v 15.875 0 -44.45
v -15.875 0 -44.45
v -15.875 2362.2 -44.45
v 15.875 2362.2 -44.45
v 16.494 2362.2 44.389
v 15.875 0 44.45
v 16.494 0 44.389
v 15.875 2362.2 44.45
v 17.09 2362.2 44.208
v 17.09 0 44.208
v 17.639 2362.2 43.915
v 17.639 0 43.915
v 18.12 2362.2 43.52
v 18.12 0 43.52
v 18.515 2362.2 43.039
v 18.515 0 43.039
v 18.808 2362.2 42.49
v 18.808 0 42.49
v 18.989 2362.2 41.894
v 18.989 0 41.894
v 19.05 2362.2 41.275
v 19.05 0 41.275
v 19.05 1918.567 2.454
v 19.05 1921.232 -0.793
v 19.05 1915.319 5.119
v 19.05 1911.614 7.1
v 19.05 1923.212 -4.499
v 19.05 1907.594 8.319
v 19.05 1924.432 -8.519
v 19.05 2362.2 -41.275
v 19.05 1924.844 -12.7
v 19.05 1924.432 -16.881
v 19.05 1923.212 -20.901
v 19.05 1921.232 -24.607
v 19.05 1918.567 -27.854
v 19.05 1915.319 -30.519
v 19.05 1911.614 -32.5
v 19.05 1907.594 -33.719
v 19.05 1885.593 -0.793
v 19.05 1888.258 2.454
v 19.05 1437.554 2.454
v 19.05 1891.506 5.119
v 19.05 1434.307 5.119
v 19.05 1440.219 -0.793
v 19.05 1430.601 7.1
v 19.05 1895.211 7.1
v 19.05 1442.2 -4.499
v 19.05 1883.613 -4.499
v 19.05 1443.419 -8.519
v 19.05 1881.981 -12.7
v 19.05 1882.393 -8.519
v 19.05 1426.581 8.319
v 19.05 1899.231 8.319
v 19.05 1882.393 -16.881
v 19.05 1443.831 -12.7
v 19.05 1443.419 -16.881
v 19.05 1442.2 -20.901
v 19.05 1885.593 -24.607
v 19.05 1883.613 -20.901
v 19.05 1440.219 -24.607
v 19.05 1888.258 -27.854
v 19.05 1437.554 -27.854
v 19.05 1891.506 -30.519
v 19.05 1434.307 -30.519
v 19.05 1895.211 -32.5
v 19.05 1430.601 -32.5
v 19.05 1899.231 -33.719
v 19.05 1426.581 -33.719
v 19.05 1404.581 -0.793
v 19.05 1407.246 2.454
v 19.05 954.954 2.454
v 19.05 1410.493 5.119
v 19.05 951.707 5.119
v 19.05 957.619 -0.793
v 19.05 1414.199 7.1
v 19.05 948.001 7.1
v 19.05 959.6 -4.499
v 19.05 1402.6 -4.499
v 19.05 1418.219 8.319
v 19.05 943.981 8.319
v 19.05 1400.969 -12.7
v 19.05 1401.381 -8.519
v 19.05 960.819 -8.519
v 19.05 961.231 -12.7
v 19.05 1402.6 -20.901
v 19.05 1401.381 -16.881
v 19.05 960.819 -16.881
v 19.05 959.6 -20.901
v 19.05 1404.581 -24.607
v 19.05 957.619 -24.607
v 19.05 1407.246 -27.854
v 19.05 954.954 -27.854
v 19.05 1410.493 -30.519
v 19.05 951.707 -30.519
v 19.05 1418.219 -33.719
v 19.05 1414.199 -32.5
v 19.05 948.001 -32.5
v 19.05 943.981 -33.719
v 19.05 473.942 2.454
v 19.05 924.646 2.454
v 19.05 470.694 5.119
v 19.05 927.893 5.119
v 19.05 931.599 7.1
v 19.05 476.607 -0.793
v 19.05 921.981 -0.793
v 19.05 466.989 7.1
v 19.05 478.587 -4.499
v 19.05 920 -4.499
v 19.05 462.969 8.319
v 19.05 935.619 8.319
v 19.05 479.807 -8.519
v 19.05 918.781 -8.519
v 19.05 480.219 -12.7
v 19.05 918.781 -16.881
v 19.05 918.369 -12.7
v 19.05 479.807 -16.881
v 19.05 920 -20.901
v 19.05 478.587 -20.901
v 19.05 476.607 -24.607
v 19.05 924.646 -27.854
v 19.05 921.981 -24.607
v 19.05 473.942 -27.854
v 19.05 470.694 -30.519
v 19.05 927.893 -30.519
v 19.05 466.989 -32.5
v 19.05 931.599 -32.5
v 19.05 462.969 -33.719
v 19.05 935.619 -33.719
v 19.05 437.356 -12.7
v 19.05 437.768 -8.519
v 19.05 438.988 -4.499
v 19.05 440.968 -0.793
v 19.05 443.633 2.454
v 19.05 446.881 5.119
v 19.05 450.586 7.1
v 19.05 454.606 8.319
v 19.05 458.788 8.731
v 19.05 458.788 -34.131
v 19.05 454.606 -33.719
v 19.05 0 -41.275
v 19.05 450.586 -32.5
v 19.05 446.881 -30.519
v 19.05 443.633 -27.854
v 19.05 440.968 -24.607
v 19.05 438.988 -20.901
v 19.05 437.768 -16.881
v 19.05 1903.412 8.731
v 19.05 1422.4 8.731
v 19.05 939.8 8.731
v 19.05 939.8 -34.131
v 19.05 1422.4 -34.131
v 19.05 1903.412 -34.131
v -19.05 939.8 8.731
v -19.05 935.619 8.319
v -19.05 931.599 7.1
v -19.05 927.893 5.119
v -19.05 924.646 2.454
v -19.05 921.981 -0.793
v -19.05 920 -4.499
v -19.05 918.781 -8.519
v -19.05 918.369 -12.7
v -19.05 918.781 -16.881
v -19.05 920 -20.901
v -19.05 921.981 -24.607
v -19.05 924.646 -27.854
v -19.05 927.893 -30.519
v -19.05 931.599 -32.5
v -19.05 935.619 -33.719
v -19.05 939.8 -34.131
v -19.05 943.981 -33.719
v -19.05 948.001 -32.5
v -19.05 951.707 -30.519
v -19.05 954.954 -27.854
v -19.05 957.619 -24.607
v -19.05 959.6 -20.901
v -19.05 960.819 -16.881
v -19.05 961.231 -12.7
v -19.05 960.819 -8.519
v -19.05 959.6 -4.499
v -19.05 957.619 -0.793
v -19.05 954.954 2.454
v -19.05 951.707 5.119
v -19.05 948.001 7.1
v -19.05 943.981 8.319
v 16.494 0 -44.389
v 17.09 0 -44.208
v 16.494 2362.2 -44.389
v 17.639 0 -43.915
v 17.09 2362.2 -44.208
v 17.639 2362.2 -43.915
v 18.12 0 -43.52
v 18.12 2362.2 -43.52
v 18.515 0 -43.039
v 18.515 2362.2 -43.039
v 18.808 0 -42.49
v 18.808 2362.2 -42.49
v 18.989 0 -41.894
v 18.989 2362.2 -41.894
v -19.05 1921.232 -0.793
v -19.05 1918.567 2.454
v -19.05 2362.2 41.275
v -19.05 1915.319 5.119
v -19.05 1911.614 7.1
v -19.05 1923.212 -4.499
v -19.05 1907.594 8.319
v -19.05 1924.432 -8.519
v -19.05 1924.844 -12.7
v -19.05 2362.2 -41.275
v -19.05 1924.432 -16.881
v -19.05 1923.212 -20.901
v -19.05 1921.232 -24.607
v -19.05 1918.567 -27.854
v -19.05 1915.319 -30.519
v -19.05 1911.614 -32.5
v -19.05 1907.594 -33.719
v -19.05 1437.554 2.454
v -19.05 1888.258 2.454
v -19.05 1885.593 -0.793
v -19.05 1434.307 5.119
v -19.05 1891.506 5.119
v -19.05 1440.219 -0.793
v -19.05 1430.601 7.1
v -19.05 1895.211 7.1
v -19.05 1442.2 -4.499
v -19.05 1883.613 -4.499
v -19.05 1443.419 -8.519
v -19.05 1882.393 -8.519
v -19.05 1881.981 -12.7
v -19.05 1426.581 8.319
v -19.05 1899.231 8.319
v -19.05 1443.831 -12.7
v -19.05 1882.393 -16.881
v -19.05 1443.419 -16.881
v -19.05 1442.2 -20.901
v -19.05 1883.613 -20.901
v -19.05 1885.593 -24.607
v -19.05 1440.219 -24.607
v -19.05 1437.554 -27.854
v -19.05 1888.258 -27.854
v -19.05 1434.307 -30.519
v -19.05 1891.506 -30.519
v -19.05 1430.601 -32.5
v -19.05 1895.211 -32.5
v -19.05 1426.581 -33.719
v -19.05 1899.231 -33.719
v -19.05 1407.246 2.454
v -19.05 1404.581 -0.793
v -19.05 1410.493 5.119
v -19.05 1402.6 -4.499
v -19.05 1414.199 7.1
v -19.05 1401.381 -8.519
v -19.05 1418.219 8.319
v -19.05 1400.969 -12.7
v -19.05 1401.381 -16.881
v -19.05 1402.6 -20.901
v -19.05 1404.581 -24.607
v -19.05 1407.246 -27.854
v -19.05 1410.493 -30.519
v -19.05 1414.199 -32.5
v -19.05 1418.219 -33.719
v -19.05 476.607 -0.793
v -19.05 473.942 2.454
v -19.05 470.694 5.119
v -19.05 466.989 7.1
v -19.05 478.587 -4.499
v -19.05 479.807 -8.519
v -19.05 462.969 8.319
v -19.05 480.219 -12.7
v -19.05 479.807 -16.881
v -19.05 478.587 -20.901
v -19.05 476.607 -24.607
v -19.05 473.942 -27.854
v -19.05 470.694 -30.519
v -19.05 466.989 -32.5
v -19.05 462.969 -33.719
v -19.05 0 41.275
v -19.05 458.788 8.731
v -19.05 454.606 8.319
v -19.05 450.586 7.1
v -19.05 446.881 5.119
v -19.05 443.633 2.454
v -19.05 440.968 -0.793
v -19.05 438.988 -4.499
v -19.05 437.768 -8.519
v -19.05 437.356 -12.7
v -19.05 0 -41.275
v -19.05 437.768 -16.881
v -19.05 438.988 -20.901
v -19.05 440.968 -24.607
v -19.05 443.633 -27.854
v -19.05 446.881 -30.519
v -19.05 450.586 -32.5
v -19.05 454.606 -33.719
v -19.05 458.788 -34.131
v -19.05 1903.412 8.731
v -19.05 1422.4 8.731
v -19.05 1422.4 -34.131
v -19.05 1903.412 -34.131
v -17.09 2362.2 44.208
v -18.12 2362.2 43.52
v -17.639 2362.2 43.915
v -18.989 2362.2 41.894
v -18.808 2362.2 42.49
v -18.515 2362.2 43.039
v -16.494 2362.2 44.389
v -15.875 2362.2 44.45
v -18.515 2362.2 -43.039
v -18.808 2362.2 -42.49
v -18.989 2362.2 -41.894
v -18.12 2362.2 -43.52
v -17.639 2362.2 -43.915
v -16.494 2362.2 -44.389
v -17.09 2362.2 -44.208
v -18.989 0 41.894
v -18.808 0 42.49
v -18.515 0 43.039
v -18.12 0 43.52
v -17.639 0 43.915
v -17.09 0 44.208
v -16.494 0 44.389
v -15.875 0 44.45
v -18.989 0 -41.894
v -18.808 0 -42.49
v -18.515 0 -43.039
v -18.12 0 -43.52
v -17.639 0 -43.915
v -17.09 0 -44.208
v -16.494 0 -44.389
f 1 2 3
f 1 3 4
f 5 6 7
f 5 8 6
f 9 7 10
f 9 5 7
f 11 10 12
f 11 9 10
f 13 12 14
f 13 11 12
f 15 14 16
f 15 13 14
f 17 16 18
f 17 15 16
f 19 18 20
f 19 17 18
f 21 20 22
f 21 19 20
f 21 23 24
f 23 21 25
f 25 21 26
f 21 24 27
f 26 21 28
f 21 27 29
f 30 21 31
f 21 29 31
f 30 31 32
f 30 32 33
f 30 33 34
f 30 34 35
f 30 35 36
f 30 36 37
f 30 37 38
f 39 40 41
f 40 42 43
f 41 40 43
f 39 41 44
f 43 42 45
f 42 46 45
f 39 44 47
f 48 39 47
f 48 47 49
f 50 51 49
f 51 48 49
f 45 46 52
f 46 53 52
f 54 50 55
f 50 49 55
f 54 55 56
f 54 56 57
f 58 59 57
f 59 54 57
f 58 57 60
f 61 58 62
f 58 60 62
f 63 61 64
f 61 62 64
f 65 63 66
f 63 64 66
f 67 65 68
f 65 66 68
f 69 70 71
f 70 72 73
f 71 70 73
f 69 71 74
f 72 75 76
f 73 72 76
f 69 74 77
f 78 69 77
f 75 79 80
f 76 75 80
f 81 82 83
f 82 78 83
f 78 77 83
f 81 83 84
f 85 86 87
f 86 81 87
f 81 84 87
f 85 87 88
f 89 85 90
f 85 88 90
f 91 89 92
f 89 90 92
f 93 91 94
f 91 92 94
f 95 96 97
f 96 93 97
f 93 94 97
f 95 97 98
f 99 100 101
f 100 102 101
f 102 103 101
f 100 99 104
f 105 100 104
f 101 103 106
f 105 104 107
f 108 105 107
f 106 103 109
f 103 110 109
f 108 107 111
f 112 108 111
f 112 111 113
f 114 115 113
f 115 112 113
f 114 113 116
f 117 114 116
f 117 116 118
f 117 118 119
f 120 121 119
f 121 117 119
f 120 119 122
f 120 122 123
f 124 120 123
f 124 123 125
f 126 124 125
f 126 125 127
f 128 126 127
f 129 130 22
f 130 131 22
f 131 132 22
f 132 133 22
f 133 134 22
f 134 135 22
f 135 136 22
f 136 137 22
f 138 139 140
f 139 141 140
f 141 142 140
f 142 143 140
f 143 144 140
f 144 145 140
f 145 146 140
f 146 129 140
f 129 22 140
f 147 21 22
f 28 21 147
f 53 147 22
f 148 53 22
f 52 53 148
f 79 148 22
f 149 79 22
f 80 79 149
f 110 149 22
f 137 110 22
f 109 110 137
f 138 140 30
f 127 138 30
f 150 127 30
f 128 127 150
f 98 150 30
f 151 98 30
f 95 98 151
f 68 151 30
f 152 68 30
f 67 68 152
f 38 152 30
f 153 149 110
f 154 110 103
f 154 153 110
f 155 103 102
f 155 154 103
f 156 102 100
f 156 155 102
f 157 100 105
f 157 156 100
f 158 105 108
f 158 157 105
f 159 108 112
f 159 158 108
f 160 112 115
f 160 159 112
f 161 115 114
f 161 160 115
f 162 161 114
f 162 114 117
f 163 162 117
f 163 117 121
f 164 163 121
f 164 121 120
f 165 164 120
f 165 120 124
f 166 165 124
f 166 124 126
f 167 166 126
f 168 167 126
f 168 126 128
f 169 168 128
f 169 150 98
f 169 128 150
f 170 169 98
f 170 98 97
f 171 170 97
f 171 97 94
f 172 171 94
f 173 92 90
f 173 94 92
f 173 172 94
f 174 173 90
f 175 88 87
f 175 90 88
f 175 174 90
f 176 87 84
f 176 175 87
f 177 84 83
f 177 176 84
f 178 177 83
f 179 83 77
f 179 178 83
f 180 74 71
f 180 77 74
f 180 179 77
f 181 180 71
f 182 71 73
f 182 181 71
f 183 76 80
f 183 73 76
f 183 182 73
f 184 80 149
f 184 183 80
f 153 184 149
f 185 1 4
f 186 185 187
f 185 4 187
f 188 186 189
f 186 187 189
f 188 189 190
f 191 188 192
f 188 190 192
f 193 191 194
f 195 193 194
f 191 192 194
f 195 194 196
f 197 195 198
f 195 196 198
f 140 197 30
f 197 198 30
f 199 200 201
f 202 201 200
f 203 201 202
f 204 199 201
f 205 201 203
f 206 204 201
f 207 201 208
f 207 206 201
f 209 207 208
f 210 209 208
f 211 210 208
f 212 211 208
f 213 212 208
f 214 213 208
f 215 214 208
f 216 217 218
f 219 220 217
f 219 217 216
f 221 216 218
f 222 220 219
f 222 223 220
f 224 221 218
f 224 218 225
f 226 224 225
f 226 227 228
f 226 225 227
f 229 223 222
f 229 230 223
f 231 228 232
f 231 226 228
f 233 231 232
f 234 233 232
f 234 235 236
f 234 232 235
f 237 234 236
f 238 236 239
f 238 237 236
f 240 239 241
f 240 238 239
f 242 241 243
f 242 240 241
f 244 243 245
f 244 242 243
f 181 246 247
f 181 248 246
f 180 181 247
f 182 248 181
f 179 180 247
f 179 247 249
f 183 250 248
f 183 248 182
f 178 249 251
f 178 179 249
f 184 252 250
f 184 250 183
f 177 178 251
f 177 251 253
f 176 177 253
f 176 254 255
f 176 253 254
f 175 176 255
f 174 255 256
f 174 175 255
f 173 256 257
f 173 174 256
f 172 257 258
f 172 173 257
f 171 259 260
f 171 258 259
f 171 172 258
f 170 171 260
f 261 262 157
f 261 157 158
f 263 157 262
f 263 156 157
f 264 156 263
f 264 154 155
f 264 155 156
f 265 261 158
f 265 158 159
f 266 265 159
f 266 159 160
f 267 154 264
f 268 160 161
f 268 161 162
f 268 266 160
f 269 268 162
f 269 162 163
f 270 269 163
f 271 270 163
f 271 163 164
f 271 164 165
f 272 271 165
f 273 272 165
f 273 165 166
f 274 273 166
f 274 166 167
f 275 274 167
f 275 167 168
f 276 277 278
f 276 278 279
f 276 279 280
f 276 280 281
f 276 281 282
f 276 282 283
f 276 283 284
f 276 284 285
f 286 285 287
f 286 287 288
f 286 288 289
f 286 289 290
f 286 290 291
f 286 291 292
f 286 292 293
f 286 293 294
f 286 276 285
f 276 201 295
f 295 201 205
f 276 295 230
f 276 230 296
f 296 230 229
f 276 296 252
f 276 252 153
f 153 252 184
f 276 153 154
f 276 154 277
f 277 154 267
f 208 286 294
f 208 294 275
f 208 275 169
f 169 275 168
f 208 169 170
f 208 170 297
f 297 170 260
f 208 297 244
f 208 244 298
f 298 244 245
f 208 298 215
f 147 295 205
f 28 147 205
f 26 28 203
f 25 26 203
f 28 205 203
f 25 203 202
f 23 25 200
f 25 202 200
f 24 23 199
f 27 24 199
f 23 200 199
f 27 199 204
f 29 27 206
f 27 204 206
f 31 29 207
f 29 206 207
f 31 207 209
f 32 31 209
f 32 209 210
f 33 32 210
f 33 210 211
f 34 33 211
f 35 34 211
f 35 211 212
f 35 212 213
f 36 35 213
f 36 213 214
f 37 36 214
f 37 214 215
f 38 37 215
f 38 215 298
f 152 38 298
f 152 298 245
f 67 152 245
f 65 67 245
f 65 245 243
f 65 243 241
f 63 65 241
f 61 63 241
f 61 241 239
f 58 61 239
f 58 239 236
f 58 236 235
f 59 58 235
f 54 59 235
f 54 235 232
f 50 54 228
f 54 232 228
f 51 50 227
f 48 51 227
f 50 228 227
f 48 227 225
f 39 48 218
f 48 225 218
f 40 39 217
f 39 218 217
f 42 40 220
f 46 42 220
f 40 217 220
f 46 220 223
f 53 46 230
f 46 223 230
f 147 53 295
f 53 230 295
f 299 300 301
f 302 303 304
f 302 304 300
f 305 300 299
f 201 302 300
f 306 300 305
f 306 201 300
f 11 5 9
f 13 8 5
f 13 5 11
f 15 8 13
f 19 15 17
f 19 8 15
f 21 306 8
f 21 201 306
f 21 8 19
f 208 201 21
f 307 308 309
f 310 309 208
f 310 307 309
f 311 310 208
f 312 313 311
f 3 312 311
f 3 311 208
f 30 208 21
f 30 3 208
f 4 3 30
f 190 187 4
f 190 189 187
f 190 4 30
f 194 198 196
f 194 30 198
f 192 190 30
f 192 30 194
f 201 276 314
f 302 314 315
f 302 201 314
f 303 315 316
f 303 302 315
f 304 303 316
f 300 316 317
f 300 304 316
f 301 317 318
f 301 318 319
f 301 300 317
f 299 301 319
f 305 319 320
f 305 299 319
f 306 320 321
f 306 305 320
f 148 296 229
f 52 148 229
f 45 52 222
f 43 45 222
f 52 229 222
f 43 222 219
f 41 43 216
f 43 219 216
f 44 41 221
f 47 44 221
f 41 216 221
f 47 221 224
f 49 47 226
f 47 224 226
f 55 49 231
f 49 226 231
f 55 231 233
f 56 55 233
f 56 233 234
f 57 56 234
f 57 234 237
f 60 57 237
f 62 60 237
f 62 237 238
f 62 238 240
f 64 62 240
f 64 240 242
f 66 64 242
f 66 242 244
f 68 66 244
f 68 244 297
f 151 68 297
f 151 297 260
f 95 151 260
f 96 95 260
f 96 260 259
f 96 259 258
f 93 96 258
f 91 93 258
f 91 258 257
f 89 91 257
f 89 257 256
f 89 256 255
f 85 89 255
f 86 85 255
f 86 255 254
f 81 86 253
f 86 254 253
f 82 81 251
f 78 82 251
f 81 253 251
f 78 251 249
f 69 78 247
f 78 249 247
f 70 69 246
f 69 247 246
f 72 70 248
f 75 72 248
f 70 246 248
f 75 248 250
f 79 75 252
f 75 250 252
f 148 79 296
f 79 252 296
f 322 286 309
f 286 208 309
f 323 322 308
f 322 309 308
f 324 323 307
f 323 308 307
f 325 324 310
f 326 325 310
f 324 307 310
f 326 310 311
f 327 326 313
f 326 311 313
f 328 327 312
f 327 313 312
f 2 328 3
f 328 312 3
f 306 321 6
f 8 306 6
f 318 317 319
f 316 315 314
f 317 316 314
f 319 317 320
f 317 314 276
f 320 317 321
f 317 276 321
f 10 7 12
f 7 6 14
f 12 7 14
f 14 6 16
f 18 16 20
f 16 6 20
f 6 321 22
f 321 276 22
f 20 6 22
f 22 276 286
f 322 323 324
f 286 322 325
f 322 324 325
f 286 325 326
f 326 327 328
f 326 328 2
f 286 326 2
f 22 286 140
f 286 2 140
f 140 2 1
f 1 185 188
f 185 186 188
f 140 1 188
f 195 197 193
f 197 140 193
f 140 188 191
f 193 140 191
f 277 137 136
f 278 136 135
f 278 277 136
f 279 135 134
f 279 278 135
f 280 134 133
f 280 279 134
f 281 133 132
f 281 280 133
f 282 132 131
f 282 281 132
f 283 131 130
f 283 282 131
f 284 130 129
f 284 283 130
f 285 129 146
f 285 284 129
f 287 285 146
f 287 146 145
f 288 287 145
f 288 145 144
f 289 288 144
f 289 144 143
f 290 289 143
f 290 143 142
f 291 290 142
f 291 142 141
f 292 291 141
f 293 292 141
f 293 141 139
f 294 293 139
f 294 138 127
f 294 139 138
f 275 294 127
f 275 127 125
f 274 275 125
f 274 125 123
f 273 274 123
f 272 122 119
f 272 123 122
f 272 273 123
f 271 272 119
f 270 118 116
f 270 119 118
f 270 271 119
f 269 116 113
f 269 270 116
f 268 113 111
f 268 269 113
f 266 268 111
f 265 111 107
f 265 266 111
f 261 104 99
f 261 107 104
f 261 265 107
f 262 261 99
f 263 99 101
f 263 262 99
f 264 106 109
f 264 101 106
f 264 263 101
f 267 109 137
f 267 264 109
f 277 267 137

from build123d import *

# Parameters (mm, degrees)
SKETCH1_W           = 38.1
SKETCH1_H           = 88.9
BOSS_EXTRUDE1_DEPTH = 2362.2
SKETCH2_R           = 21.43125
CUT_EXTRUDE4_DEPTH  = 2363.925359062
FILLET1_R           = 3.175


with BuildPart() as part:
    # Sketch1 → Boss-Extrude1 (new body)
    with BuildSketch(Plane(origin=(0, 0, 0), x_dir=(1, 0, 0), z_dir=(0, 1, 0))):
        Rectangle(SKETCH1_W, SKETCH1_H)
    extrude(amount=BOSS_EXTRUDE1_DEPTH)

    # Sketch2 → Cut-Extrude4 (cut, through all)
    with BuildSketch(Plane(origin=(-19.05, 0, 0), x_dir=(0, 0, -1), z_dir=(1, 0, 0))):
        with Locations(Location((12.7, 458.7875, 0), (0, 0, 180))):
            Circle(SKETCH2_R)
        with Locations(Location((12.7, 939.8, 0), (0, 0, 180))):
            Circle(SKETCH2_R)
    cut_extrude4 = extrude(amount=CUT_EXTRUDE4_DEPTH, mode=Mode.SUBTRACT)

    # Fillet1
    fillet1_edges = [part.edges().sort_by_distance(p)[0] for p in [
        (19.05, 1181.1, 44.45),
        (-19.05, 1181.1, 44.45),
        (-19.05, 1181.1, -44.45),
        (19.05, 1181.1, -44.45),
    ]]
    fillet(fillet1_edges, radius=FILLET1_R)

    # Mirror1: Cut-Extrude4 across plane
    add(cut_extrude4.mirror(Plane(origin=(0, 1181.1, 0), x_dir=(0, 0, 1), z_dir=(0, -1, 0))), mode=Mode.SUBTRACT)


solid = part.part
